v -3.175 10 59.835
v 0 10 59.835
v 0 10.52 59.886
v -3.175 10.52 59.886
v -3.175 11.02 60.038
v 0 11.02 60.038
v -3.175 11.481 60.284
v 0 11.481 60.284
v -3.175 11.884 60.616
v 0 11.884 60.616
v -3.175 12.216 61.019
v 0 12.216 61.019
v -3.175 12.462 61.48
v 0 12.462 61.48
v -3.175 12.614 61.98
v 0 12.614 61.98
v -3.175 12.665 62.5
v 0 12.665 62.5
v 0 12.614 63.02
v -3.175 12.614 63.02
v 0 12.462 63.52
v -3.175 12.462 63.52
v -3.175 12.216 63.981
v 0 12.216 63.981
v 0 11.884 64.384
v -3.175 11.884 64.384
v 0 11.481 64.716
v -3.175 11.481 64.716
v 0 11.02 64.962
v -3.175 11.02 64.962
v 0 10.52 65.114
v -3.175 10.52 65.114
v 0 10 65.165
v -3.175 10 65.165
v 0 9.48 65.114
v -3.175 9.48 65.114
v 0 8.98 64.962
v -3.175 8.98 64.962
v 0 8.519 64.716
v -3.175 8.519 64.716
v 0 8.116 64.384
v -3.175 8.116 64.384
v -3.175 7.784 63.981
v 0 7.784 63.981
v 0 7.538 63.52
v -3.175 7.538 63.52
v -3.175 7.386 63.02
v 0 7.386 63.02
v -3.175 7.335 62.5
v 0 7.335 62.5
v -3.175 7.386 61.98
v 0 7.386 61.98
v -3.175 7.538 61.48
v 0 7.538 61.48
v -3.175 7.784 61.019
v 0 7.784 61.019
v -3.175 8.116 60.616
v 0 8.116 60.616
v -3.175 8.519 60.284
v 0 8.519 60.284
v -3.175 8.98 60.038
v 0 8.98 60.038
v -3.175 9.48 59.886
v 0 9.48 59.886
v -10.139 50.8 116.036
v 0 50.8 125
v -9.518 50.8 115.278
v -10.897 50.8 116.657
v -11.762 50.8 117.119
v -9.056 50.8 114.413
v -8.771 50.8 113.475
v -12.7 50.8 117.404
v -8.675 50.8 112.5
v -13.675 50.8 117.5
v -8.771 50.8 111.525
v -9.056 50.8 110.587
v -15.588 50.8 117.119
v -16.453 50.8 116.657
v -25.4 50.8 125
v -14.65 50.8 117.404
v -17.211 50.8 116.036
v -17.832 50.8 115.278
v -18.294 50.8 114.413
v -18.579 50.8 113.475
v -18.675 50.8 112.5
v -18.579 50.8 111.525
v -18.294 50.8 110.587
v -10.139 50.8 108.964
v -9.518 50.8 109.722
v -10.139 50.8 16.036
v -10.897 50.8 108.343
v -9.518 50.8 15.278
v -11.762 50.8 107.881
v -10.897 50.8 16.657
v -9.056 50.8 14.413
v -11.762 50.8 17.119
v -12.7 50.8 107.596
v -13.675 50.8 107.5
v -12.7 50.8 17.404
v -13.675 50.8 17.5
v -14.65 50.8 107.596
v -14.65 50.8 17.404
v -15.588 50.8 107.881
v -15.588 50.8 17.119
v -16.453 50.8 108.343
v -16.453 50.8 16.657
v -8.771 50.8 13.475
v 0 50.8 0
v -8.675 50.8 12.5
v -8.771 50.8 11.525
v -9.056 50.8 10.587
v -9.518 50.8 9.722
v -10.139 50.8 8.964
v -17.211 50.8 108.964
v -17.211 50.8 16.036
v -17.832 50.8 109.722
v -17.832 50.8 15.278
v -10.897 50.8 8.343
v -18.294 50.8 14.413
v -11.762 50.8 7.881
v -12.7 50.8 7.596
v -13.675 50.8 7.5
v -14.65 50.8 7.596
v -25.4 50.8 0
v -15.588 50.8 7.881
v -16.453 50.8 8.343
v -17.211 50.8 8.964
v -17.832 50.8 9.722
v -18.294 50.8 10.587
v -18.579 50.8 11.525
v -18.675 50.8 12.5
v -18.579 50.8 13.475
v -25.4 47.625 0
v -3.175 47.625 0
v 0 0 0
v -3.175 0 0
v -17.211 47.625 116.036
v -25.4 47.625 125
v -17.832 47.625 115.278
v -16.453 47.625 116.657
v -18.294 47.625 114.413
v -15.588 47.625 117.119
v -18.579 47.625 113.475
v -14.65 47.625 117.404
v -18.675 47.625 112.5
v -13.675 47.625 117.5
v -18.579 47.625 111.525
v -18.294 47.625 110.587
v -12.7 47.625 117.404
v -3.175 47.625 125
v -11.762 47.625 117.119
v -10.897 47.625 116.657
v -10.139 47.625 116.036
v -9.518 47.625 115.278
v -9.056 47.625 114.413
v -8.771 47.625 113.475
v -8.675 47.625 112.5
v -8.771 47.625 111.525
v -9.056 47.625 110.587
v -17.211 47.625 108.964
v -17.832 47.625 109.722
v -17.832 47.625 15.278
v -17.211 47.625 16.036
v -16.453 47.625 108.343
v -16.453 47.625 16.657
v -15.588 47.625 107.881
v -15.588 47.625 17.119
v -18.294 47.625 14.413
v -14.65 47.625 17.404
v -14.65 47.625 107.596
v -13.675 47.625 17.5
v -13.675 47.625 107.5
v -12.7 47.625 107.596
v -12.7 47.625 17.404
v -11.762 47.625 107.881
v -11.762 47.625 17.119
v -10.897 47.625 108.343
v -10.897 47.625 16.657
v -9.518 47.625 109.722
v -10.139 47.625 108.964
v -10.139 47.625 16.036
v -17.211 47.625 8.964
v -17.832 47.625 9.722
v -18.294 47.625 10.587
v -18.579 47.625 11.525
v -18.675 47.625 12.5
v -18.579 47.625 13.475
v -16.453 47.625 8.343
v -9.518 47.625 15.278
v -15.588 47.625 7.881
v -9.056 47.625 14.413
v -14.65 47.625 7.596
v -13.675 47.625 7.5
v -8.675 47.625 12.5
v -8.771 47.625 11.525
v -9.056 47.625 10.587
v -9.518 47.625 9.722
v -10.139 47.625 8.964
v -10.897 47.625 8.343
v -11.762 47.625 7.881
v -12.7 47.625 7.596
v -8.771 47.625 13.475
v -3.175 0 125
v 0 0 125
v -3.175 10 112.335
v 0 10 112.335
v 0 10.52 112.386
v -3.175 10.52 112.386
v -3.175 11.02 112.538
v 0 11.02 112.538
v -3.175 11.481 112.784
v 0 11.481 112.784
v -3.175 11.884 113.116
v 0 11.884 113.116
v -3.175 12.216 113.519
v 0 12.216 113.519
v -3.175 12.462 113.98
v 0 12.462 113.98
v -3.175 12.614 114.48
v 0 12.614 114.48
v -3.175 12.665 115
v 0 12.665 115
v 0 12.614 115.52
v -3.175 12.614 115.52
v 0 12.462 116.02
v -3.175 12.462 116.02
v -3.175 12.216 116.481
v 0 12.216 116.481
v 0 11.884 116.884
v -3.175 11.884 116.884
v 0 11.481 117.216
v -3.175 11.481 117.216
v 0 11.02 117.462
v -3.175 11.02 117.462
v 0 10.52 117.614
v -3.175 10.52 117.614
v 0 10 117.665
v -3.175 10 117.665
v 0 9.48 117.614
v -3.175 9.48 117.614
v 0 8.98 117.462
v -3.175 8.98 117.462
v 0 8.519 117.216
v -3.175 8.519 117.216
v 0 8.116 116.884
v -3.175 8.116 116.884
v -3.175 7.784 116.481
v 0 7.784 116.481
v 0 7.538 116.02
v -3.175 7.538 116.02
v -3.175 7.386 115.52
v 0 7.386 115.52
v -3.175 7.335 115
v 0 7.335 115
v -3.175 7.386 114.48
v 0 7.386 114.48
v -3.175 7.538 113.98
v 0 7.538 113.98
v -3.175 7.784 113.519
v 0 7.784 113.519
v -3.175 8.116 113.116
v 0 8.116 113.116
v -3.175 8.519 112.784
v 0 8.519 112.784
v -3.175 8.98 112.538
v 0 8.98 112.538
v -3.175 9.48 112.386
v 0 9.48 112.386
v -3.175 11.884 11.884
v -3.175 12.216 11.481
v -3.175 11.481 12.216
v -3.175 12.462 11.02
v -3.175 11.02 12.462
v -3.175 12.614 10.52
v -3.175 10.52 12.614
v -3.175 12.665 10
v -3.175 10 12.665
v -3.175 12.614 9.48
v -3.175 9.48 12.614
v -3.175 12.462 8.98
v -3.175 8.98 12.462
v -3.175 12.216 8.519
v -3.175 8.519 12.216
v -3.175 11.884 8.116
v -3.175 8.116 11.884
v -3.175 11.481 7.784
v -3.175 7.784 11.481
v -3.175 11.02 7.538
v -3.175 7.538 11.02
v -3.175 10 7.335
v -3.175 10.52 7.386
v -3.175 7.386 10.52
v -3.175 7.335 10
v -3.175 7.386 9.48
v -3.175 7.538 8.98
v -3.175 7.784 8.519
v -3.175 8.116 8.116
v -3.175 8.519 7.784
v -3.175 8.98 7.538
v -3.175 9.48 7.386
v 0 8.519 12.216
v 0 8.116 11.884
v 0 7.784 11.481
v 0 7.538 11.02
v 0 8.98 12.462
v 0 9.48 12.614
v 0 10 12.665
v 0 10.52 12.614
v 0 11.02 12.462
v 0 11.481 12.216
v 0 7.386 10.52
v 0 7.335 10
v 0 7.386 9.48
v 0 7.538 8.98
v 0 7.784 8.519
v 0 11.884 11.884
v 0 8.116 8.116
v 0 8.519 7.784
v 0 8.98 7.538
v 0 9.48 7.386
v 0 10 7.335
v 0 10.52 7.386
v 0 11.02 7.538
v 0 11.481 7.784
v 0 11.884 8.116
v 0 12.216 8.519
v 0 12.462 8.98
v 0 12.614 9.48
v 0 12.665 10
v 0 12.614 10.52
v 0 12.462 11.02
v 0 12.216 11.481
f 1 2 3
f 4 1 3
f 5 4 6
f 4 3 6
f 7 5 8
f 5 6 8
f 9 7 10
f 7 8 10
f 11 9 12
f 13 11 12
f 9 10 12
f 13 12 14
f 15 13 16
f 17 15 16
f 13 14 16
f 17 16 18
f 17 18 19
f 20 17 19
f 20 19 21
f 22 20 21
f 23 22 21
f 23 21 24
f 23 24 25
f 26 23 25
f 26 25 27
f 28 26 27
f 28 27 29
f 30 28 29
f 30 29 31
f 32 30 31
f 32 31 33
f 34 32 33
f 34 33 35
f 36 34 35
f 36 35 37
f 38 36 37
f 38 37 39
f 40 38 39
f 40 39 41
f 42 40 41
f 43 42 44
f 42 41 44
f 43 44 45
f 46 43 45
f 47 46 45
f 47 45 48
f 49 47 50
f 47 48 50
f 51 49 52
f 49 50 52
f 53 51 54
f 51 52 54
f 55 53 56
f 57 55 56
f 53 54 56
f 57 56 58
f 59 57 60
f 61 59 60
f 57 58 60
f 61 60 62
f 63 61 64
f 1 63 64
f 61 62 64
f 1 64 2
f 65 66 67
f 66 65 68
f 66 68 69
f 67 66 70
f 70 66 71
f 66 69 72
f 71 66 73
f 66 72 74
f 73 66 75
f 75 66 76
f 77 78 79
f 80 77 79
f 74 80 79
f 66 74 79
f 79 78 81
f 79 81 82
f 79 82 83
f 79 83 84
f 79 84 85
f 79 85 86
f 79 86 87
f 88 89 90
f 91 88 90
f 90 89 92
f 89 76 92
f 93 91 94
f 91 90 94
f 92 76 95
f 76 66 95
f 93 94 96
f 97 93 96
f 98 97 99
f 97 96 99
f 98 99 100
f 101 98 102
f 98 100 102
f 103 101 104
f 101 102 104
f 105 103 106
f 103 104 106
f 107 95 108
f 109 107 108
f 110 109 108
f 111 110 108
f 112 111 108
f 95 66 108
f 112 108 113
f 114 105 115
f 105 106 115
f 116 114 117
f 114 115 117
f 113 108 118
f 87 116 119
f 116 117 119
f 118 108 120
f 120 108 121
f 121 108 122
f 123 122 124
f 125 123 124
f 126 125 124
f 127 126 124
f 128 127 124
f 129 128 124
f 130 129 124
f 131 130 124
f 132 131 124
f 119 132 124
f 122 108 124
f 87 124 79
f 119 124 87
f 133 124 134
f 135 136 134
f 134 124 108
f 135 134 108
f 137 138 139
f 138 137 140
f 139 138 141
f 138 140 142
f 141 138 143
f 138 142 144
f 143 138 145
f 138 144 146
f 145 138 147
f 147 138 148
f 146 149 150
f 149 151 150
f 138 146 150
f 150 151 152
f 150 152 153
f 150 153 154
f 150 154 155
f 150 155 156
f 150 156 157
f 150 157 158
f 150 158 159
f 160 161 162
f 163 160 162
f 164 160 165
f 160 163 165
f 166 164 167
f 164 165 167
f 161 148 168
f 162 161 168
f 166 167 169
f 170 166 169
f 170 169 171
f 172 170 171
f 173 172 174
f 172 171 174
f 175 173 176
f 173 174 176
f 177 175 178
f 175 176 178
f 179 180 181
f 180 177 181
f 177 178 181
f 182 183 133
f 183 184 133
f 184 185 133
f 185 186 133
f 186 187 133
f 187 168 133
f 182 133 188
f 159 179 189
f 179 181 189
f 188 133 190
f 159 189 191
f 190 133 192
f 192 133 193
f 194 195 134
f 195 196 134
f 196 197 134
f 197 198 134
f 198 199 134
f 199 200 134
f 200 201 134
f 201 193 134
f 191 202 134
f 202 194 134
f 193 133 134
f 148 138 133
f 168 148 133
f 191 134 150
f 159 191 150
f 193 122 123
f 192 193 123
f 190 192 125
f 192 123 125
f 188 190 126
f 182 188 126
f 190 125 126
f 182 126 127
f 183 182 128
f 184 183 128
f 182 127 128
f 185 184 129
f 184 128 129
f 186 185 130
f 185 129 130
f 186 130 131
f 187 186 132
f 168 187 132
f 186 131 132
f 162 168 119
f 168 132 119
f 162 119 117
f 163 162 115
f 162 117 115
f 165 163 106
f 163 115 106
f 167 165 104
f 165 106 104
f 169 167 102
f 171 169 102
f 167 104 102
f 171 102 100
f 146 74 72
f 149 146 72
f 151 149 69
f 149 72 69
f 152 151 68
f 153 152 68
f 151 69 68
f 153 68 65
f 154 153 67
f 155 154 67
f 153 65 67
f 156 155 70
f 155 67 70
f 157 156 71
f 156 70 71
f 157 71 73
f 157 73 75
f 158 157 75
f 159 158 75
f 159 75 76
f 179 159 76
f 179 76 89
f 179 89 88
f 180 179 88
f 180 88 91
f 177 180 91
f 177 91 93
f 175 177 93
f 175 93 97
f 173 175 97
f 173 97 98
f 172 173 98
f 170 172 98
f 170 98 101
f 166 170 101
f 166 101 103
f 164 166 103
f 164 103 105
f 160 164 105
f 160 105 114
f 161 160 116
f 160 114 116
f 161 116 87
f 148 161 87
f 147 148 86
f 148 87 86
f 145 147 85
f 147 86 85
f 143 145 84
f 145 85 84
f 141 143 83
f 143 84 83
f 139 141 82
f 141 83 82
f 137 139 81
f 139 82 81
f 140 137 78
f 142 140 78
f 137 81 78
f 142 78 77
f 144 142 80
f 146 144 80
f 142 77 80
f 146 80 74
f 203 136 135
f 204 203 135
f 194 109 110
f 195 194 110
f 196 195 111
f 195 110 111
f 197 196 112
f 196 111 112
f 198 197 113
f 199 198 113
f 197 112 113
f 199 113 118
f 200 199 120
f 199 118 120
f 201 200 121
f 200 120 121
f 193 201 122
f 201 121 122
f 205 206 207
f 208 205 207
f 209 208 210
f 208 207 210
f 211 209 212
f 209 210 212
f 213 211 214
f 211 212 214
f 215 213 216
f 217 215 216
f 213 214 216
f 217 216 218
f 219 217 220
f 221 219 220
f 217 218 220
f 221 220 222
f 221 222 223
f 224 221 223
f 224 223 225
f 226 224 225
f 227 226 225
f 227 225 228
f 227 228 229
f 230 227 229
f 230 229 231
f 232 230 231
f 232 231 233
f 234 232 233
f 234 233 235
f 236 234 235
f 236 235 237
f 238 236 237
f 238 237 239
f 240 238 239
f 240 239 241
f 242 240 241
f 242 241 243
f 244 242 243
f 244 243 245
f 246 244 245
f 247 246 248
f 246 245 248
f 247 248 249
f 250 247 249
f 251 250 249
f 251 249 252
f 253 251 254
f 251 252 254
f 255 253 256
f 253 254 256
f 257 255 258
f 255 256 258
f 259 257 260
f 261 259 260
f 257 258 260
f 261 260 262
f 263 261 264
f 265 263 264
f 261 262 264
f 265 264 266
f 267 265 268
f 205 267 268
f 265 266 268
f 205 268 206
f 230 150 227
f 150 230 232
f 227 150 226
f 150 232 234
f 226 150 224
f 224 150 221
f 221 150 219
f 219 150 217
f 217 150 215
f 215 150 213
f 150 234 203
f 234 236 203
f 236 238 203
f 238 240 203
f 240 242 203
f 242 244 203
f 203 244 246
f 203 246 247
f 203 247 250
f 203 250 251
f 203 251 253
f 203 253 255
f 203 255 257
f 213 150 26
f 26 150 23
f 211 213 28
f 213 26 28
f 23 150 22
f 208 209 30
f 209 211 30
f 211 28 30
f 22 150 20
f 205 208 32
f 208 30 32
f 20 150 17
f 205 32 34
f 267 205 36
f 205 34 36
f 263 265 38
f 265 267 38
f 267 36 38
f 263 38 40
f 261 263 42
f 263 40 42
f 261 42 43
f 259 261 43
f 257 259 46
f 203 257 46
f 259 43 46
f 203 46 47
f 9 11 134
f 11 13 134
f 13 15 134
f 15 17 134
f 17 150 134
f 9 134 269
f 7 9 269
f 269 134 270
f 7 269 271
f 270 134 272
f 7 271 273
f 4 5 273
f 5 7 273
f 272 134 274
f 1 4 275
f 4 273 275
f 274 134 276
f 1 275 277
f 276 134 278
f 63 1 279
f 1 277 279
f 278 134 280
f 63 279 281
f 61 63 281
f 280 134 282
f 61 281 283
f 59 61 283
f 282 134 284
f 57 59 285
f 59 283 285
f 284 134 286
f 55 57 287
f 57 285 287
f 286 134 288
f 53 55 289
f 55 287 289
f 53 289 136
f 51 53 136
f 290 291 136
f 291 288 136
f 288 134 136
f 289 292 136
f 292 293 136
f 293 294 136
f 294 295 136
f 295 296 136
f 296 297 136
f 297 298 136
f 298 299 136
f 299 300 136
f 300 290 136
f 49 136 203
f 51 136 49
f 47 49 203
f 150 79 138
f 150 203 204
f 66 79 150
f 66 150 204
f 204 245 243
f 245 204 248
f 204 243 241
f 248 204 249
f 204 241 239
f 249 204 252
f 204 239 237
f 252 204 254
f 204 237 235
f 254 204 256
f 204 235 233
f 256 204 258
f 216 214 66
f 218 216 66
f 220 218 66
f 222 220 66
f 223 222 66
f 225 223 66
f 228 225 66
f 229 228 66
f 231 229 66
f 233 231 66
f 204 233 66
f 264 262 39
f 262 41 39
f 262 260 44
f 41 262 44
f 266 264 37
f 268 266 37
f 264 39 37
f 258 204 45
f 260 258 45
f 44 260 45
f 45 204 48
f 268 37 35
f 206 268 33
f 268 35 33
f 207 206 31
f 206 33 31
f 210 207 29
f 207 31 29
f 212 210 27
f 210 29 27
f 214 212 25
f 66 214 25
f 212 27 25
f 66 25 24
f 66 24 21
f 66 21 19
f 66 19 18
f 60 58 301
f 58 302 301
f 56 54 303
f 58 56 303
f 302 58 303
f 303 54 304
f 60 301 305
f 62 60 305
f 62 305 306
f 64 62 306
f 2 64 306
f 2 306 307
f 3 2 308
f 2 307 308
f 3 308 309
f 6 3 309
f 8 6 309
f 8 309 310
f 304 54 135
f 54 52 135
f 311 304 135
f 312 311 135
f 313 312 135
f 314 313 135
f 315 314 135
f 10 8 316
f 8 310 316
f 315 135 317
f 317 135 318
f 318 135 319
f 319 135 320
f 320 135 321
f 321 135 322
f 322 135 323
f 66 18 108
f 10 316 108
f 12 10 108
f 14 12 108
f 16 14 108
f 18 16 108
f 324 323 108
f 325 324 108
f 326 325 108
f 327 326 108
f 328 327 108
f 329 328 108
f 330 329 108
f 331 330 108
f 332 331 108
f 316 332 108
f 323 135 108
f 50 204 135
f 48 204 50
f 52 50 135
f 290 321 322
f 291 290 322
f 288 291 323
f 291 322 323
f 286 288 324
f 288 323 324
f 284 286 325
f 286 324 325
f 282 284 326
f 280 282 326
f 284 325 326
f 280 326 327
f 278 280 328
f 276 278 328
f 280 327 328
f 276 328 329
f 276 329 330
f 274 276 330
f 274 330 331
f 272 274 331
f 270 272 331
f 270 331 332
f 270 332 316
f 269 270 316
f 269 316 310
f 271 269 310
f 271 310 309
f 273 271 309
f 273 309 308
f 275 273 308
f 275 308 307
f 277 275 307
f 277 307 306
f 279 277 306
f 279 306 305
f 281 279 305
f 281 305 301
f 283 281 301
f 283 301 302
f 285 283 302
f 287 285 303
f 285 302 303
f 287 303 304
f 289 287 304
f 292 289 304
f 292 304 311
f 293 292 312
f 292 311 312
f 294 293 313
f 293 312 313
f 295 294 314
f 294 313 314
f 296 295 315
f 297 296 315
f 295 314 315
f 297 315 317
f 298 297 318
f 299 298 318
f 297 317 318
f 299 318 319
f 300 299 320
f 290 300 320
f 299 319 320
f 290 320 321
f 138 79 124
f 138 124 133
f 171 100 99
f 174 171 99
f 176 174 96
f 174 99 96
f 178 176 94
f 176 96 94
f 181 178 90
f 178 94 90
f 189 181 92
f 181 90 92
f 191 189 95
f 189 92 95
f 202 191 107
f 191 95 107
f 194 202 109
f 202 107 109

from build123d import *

# Parameters (mm, degrees)
BOSS_EXTRUDE1_DEPTH = 125
CUT_EXTRUDE1_REACH  = 139.298
SKETCH2_R           = 2.665
CUT_EXTRUDE2_REACH  = 139.298
SKETCH3_R           = 5


with BuildPart() as part:
    # Sketch1 → Boss-Extrude1 (new body)
    with BuildSketch(Plane.XY):
        Polygon((0, 0), (0, 50.8), (-25.4, 50.8), (-25.4, 47.625), (-3.175, 47.625), (-3.175, 0), align=None)
    extrude(amount=BOSS_EXTRUDE1_DEPTH)

    # Sketch2 → Cut-Extrude1 (cut, up to next)
    with BuildSketch(Plane(origin=(0, 0, 0), x_dir=(0, 0, -1), z_dir=(1, 0, 0)), mode=Mode.PRIVATE) as cut_extrude1_sk1:
        with Locations((-115, 10)):
            Circle(SKETCH2_R)
    cut_extrude1_tool1 = extrude(cut_extrude1_sk1.sketch, amount=-CUT_EXTRUDE1_REACH, mode=Mode.PRIVATE) & part.part
    # Sketch2 → Cut-Extrude1 (cut, up to next)
    with BuildSketch(Plane(origin=(0, 0, 0), x_dir=(0, 0, -1), z_dir=(1, 0, 0)), mode=Mode.PRIVATE) as cut_extrude1_sk2:
        with Locations((-10, 10)):
            Circle(SKETCH2_R)
    cut_extrude1_tool2 = extrude(cut_extrude1_sk2.sketch, amount=-CUT_EXTRUDE1_REACH, mode=Mode.PRIVATE) & part.part
    # Sketch2 → Cut-Extrude1 (cut, up to next)
    with BuildSketch(Plane(origin=(0, 0, 0), x_dir=(0, 0, -1), z_dir=(1, 0, 0)), mode=Mode.PRIVATE) as cut_extrude1_sk3:
        with Locations((-62.5, 10)):
            Circle(SKETCH2_R)
    cut_extrude1_tool3 = extrude(cut_extrude1_sk3.sketch, amount=-CUT_EXTRUDE1_REACH, mode=Mode.PRIVATE) & part.part
    add(cut_extrude1_tool1.solids().sort_by_distance((0, 10, 115))[0], mode=Mode.SUBTRACT)
    add(cut_extrude1_tool2.solids().sort_by_distance((0, 10, 10))[0], mode=Mode.SUBTRACT)
    add(cut_extrude1_tool3.solids().sort_by_distance((0, 10, 62.5))[0], mode=Mode.SUBTRACT)

    # Sketch3 → Cut-Extrude2 (cut, up to next)
    with BuildSketch(Plane(origin=(0, 50.8, 0), x_dir=(1, 0, 0), z_dir=(0, 1, 0)), mode=Mode.PRIVATE) as cut_extrude2_sk1:
        with Locations(Location((-13.675, -112.5, 0), (0, 0, 270))):
            Circle(SKETCH3_R)
    cut_extrude2_tool1 = extrude(cut_extrude2_sk1.sketch, amount=-CUT_EXTRUDE2_REACH, mode=Mode.PRIVATE) & part.part
    # Sketch3 → Cut-Extrude2 (cut, up to next)
    with BuildSketch(Plane(origin=(0, 50.8, 0), x_dir=(1, 0, 0), z_dir=(0, 1, 0)), mode=Mode.PRIVATE) as cut_extrude2_sk2:
        with BuildLine():
            ThreePointArc((-8.675, -12.5), (-10.139466094, -8.964466094), (-13.675, -7.5))
            ThreePointArc((-13.675, -7.5), (-18.675, -12.5), (-13.675, -17.5))
            ThreePointArc((-13.675, -17.5), (-10.139466094, -16.035533906), (-8.675, -12.5))
        make_face()
    cut_extrude2_tool2 = extrude(cut_extrude2_sk2.sketch, amount=-CUT_EXTRUDE2_REACH, mode=Mode.PRIVATE) & part.part
    add(cut_extrude2_tool1.solids().sort_by_distance((-13.675, 50.8, 112.5))[0], mode=Mode.SUBTRACT)
    add(cut_extrude2_tool2.solids().sort_by_distance((-13.675, 50.8, 12.5))[0], mode=Mode.SUBTRACT)


solid = part.part
